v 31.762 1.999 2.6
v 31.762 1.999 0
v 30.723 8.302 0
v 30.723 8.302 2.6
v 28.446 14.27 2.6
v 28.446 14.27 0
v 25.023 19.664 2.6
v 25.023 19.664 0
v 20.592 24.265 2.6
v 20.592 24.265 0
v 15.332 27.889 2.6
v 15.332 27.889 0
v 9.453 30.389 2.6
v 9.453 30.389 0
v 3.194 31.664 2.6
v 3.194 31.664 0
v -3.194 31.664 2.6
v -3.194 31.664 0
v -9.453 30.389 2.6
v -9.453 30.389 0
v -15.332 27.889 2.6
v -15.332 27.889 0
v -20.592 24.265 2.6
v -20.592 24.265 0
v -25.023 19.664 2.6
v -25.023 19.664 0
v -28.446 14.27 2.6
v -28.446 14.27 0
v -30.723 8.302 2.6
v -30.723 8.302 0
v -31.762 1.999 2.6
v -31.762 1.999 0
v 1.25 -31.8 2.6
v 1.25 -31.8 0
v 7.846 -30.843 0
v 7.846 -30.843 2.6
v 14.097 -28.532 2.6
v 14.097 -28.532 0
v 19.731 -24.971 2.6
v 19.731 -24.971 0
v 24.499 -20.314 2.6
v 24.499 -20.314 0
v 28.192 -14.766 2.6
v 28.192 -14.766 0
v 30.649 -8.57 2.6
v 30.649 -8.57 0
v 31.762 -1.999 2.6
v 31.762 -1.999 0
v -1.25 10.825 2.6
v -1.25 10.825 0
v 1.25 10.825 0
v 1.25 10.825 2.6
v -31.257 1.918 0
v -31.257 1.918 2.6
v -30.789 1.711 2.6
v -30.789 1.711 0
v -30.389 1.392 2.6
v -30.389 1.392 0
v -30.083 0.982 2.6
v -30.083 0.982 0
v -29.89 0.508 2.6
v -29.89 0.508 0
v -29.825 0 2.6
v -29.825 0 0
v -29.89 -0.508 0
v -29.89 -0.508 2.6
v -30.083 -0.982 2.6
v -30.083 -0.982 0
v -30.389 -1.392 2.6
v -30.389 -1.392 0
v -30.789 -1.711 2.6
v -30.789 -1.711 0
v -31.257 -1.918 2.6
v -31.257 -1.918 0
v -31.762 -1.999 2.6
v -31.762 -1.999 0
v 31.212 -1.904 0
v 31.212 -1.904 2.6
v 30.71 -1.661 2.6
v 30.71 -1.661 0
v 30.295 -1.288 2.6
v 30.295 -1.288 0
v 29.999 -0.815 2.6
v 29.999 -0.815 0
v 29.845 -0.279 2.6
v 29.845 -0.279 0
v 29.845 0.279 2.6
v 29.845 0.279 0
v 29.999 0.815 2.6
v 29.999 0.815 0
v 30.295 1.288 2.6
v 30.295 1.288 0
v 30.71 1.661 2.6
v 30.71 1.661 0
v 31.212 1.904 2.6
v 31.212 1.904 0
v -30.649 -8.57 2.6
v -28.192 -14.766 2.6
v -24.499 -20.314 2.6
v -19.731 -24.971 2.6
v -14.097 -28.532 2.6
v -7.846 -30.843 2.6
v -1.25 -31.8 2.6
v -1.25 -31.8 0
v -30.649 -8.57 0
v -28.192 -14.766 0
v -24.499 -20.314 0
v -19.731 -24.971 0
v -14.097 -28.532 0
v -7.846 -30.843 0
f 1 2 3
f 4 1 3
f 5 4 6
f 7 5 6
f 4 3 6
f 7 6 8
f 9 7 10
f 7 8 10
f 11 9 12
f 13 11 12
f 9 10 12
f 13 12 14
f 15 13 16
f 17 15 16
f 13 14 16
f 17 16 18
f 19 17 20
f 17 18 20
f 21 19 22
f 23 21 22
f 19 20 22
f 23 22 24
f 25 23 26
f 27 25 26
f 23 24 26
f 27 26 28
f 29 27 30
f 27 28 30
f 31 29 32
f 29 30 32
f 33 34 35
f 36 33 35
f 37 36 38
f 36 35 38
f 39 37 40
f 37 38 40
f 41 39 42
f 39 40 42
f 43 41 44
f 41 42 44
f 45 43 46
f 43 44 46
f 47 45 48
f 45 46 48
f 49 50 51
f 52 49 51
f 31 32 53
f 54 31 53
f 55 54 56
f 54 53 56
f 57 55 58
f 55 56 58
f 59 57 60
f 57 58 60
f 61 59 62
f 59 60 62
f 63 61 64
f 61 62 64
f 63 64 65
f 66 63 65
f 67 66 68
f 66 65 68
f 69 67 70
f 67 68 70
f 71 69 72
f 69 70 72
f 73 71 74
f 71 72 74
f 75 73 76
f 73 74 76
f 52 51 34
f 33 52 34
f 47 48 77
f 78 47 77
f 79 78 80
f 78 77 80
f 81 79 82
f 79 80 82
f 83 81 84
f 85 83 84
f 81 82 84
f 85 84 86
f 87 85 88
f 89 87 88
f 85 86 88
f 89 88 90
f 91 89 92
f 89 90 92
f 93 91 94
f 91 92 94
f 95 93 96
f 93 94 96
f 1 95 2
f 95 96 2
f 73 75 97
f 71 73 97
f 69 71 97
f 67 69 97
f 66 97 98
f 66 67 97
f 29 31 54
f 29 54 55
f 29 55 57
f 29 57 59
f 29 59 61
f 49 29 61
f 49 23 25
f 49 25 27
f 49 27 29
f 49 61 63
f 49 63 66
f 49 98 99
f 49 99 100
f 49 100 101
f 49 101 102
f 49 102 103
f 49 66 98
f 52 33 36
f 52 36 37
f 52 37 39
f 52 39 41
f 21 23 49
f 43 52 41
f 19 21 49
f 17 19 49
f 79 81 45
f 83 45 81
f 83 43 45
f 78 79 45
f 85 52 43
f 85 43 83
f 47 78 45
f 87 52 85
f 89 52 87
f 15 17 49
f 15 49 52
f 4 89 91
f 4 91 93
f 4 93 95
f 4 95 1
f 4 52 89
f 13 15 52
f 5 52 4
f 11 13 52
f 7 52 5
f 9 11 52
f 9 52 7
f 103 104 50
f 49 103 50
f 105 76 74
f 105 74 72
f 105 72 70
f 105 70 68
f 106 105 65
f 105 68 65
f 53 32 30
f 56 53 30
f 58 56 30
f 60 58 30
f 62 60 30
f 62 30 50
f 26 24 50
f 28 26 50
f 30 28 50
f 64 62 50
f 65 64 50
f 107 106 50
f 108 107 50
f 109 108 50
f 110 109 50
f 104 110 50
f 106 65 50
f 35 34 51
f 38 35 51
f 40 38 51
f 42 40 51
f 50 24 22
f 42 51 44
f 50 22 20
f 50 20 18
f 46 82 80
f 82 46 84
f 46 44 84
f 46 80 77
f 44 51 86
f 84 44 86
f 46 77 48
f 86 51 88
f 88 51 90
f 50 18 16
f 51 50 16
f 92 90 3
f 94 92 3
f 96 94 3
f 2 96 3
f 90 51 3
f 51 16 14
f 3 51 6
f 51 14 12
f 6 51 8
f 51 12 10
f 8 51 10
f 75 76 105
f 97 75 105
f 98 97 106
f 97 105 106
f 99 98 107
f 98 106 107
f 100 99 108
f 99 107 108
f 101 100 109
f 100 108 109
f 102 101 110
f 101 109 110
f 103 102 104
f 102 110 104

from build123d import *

# Parameters (mm, degrees)
F1_DEPTH = 2.6


with BuildPart() as f1:
    # F0 (on Top) → F1 (new body)
    with BuildSketch(Plane.XY):
        with BuildLine():
            ThreePointArc((31.762156, -1.999012), (29.825, 0), (31.762156, 1.999012))
            ThreePointArc((31.762156, 1.999012), (0, 31.825), (-31.762156, 1.999012))
            ThreePointArc((-31.762156, 1.999012), (-30.38874, 1.391818), (-29.825, 0))
            ThreePointArc((-29.825, 0), (-30.38874, -1.391818), (-31.762156, -1.999012))
            ThreePointArc((-31.762156, -1.999012), (-22.236949, -22.767273), (-1.25, -31.800442))
            Line((-1.25, -31.800442), (-1.25, 10.825))
            Line((-1.25, 10.825), (1.25, 10.825))
            Line((1.25, 10.825), (1.25, -31.800442))
            ThreePointArc((1.25, -31.800442), (22.236949, -22.767273), (31.762156, -1.999012))
        make_face()
    extrude(amount=F1_DEPTH)


solid = f1.part
